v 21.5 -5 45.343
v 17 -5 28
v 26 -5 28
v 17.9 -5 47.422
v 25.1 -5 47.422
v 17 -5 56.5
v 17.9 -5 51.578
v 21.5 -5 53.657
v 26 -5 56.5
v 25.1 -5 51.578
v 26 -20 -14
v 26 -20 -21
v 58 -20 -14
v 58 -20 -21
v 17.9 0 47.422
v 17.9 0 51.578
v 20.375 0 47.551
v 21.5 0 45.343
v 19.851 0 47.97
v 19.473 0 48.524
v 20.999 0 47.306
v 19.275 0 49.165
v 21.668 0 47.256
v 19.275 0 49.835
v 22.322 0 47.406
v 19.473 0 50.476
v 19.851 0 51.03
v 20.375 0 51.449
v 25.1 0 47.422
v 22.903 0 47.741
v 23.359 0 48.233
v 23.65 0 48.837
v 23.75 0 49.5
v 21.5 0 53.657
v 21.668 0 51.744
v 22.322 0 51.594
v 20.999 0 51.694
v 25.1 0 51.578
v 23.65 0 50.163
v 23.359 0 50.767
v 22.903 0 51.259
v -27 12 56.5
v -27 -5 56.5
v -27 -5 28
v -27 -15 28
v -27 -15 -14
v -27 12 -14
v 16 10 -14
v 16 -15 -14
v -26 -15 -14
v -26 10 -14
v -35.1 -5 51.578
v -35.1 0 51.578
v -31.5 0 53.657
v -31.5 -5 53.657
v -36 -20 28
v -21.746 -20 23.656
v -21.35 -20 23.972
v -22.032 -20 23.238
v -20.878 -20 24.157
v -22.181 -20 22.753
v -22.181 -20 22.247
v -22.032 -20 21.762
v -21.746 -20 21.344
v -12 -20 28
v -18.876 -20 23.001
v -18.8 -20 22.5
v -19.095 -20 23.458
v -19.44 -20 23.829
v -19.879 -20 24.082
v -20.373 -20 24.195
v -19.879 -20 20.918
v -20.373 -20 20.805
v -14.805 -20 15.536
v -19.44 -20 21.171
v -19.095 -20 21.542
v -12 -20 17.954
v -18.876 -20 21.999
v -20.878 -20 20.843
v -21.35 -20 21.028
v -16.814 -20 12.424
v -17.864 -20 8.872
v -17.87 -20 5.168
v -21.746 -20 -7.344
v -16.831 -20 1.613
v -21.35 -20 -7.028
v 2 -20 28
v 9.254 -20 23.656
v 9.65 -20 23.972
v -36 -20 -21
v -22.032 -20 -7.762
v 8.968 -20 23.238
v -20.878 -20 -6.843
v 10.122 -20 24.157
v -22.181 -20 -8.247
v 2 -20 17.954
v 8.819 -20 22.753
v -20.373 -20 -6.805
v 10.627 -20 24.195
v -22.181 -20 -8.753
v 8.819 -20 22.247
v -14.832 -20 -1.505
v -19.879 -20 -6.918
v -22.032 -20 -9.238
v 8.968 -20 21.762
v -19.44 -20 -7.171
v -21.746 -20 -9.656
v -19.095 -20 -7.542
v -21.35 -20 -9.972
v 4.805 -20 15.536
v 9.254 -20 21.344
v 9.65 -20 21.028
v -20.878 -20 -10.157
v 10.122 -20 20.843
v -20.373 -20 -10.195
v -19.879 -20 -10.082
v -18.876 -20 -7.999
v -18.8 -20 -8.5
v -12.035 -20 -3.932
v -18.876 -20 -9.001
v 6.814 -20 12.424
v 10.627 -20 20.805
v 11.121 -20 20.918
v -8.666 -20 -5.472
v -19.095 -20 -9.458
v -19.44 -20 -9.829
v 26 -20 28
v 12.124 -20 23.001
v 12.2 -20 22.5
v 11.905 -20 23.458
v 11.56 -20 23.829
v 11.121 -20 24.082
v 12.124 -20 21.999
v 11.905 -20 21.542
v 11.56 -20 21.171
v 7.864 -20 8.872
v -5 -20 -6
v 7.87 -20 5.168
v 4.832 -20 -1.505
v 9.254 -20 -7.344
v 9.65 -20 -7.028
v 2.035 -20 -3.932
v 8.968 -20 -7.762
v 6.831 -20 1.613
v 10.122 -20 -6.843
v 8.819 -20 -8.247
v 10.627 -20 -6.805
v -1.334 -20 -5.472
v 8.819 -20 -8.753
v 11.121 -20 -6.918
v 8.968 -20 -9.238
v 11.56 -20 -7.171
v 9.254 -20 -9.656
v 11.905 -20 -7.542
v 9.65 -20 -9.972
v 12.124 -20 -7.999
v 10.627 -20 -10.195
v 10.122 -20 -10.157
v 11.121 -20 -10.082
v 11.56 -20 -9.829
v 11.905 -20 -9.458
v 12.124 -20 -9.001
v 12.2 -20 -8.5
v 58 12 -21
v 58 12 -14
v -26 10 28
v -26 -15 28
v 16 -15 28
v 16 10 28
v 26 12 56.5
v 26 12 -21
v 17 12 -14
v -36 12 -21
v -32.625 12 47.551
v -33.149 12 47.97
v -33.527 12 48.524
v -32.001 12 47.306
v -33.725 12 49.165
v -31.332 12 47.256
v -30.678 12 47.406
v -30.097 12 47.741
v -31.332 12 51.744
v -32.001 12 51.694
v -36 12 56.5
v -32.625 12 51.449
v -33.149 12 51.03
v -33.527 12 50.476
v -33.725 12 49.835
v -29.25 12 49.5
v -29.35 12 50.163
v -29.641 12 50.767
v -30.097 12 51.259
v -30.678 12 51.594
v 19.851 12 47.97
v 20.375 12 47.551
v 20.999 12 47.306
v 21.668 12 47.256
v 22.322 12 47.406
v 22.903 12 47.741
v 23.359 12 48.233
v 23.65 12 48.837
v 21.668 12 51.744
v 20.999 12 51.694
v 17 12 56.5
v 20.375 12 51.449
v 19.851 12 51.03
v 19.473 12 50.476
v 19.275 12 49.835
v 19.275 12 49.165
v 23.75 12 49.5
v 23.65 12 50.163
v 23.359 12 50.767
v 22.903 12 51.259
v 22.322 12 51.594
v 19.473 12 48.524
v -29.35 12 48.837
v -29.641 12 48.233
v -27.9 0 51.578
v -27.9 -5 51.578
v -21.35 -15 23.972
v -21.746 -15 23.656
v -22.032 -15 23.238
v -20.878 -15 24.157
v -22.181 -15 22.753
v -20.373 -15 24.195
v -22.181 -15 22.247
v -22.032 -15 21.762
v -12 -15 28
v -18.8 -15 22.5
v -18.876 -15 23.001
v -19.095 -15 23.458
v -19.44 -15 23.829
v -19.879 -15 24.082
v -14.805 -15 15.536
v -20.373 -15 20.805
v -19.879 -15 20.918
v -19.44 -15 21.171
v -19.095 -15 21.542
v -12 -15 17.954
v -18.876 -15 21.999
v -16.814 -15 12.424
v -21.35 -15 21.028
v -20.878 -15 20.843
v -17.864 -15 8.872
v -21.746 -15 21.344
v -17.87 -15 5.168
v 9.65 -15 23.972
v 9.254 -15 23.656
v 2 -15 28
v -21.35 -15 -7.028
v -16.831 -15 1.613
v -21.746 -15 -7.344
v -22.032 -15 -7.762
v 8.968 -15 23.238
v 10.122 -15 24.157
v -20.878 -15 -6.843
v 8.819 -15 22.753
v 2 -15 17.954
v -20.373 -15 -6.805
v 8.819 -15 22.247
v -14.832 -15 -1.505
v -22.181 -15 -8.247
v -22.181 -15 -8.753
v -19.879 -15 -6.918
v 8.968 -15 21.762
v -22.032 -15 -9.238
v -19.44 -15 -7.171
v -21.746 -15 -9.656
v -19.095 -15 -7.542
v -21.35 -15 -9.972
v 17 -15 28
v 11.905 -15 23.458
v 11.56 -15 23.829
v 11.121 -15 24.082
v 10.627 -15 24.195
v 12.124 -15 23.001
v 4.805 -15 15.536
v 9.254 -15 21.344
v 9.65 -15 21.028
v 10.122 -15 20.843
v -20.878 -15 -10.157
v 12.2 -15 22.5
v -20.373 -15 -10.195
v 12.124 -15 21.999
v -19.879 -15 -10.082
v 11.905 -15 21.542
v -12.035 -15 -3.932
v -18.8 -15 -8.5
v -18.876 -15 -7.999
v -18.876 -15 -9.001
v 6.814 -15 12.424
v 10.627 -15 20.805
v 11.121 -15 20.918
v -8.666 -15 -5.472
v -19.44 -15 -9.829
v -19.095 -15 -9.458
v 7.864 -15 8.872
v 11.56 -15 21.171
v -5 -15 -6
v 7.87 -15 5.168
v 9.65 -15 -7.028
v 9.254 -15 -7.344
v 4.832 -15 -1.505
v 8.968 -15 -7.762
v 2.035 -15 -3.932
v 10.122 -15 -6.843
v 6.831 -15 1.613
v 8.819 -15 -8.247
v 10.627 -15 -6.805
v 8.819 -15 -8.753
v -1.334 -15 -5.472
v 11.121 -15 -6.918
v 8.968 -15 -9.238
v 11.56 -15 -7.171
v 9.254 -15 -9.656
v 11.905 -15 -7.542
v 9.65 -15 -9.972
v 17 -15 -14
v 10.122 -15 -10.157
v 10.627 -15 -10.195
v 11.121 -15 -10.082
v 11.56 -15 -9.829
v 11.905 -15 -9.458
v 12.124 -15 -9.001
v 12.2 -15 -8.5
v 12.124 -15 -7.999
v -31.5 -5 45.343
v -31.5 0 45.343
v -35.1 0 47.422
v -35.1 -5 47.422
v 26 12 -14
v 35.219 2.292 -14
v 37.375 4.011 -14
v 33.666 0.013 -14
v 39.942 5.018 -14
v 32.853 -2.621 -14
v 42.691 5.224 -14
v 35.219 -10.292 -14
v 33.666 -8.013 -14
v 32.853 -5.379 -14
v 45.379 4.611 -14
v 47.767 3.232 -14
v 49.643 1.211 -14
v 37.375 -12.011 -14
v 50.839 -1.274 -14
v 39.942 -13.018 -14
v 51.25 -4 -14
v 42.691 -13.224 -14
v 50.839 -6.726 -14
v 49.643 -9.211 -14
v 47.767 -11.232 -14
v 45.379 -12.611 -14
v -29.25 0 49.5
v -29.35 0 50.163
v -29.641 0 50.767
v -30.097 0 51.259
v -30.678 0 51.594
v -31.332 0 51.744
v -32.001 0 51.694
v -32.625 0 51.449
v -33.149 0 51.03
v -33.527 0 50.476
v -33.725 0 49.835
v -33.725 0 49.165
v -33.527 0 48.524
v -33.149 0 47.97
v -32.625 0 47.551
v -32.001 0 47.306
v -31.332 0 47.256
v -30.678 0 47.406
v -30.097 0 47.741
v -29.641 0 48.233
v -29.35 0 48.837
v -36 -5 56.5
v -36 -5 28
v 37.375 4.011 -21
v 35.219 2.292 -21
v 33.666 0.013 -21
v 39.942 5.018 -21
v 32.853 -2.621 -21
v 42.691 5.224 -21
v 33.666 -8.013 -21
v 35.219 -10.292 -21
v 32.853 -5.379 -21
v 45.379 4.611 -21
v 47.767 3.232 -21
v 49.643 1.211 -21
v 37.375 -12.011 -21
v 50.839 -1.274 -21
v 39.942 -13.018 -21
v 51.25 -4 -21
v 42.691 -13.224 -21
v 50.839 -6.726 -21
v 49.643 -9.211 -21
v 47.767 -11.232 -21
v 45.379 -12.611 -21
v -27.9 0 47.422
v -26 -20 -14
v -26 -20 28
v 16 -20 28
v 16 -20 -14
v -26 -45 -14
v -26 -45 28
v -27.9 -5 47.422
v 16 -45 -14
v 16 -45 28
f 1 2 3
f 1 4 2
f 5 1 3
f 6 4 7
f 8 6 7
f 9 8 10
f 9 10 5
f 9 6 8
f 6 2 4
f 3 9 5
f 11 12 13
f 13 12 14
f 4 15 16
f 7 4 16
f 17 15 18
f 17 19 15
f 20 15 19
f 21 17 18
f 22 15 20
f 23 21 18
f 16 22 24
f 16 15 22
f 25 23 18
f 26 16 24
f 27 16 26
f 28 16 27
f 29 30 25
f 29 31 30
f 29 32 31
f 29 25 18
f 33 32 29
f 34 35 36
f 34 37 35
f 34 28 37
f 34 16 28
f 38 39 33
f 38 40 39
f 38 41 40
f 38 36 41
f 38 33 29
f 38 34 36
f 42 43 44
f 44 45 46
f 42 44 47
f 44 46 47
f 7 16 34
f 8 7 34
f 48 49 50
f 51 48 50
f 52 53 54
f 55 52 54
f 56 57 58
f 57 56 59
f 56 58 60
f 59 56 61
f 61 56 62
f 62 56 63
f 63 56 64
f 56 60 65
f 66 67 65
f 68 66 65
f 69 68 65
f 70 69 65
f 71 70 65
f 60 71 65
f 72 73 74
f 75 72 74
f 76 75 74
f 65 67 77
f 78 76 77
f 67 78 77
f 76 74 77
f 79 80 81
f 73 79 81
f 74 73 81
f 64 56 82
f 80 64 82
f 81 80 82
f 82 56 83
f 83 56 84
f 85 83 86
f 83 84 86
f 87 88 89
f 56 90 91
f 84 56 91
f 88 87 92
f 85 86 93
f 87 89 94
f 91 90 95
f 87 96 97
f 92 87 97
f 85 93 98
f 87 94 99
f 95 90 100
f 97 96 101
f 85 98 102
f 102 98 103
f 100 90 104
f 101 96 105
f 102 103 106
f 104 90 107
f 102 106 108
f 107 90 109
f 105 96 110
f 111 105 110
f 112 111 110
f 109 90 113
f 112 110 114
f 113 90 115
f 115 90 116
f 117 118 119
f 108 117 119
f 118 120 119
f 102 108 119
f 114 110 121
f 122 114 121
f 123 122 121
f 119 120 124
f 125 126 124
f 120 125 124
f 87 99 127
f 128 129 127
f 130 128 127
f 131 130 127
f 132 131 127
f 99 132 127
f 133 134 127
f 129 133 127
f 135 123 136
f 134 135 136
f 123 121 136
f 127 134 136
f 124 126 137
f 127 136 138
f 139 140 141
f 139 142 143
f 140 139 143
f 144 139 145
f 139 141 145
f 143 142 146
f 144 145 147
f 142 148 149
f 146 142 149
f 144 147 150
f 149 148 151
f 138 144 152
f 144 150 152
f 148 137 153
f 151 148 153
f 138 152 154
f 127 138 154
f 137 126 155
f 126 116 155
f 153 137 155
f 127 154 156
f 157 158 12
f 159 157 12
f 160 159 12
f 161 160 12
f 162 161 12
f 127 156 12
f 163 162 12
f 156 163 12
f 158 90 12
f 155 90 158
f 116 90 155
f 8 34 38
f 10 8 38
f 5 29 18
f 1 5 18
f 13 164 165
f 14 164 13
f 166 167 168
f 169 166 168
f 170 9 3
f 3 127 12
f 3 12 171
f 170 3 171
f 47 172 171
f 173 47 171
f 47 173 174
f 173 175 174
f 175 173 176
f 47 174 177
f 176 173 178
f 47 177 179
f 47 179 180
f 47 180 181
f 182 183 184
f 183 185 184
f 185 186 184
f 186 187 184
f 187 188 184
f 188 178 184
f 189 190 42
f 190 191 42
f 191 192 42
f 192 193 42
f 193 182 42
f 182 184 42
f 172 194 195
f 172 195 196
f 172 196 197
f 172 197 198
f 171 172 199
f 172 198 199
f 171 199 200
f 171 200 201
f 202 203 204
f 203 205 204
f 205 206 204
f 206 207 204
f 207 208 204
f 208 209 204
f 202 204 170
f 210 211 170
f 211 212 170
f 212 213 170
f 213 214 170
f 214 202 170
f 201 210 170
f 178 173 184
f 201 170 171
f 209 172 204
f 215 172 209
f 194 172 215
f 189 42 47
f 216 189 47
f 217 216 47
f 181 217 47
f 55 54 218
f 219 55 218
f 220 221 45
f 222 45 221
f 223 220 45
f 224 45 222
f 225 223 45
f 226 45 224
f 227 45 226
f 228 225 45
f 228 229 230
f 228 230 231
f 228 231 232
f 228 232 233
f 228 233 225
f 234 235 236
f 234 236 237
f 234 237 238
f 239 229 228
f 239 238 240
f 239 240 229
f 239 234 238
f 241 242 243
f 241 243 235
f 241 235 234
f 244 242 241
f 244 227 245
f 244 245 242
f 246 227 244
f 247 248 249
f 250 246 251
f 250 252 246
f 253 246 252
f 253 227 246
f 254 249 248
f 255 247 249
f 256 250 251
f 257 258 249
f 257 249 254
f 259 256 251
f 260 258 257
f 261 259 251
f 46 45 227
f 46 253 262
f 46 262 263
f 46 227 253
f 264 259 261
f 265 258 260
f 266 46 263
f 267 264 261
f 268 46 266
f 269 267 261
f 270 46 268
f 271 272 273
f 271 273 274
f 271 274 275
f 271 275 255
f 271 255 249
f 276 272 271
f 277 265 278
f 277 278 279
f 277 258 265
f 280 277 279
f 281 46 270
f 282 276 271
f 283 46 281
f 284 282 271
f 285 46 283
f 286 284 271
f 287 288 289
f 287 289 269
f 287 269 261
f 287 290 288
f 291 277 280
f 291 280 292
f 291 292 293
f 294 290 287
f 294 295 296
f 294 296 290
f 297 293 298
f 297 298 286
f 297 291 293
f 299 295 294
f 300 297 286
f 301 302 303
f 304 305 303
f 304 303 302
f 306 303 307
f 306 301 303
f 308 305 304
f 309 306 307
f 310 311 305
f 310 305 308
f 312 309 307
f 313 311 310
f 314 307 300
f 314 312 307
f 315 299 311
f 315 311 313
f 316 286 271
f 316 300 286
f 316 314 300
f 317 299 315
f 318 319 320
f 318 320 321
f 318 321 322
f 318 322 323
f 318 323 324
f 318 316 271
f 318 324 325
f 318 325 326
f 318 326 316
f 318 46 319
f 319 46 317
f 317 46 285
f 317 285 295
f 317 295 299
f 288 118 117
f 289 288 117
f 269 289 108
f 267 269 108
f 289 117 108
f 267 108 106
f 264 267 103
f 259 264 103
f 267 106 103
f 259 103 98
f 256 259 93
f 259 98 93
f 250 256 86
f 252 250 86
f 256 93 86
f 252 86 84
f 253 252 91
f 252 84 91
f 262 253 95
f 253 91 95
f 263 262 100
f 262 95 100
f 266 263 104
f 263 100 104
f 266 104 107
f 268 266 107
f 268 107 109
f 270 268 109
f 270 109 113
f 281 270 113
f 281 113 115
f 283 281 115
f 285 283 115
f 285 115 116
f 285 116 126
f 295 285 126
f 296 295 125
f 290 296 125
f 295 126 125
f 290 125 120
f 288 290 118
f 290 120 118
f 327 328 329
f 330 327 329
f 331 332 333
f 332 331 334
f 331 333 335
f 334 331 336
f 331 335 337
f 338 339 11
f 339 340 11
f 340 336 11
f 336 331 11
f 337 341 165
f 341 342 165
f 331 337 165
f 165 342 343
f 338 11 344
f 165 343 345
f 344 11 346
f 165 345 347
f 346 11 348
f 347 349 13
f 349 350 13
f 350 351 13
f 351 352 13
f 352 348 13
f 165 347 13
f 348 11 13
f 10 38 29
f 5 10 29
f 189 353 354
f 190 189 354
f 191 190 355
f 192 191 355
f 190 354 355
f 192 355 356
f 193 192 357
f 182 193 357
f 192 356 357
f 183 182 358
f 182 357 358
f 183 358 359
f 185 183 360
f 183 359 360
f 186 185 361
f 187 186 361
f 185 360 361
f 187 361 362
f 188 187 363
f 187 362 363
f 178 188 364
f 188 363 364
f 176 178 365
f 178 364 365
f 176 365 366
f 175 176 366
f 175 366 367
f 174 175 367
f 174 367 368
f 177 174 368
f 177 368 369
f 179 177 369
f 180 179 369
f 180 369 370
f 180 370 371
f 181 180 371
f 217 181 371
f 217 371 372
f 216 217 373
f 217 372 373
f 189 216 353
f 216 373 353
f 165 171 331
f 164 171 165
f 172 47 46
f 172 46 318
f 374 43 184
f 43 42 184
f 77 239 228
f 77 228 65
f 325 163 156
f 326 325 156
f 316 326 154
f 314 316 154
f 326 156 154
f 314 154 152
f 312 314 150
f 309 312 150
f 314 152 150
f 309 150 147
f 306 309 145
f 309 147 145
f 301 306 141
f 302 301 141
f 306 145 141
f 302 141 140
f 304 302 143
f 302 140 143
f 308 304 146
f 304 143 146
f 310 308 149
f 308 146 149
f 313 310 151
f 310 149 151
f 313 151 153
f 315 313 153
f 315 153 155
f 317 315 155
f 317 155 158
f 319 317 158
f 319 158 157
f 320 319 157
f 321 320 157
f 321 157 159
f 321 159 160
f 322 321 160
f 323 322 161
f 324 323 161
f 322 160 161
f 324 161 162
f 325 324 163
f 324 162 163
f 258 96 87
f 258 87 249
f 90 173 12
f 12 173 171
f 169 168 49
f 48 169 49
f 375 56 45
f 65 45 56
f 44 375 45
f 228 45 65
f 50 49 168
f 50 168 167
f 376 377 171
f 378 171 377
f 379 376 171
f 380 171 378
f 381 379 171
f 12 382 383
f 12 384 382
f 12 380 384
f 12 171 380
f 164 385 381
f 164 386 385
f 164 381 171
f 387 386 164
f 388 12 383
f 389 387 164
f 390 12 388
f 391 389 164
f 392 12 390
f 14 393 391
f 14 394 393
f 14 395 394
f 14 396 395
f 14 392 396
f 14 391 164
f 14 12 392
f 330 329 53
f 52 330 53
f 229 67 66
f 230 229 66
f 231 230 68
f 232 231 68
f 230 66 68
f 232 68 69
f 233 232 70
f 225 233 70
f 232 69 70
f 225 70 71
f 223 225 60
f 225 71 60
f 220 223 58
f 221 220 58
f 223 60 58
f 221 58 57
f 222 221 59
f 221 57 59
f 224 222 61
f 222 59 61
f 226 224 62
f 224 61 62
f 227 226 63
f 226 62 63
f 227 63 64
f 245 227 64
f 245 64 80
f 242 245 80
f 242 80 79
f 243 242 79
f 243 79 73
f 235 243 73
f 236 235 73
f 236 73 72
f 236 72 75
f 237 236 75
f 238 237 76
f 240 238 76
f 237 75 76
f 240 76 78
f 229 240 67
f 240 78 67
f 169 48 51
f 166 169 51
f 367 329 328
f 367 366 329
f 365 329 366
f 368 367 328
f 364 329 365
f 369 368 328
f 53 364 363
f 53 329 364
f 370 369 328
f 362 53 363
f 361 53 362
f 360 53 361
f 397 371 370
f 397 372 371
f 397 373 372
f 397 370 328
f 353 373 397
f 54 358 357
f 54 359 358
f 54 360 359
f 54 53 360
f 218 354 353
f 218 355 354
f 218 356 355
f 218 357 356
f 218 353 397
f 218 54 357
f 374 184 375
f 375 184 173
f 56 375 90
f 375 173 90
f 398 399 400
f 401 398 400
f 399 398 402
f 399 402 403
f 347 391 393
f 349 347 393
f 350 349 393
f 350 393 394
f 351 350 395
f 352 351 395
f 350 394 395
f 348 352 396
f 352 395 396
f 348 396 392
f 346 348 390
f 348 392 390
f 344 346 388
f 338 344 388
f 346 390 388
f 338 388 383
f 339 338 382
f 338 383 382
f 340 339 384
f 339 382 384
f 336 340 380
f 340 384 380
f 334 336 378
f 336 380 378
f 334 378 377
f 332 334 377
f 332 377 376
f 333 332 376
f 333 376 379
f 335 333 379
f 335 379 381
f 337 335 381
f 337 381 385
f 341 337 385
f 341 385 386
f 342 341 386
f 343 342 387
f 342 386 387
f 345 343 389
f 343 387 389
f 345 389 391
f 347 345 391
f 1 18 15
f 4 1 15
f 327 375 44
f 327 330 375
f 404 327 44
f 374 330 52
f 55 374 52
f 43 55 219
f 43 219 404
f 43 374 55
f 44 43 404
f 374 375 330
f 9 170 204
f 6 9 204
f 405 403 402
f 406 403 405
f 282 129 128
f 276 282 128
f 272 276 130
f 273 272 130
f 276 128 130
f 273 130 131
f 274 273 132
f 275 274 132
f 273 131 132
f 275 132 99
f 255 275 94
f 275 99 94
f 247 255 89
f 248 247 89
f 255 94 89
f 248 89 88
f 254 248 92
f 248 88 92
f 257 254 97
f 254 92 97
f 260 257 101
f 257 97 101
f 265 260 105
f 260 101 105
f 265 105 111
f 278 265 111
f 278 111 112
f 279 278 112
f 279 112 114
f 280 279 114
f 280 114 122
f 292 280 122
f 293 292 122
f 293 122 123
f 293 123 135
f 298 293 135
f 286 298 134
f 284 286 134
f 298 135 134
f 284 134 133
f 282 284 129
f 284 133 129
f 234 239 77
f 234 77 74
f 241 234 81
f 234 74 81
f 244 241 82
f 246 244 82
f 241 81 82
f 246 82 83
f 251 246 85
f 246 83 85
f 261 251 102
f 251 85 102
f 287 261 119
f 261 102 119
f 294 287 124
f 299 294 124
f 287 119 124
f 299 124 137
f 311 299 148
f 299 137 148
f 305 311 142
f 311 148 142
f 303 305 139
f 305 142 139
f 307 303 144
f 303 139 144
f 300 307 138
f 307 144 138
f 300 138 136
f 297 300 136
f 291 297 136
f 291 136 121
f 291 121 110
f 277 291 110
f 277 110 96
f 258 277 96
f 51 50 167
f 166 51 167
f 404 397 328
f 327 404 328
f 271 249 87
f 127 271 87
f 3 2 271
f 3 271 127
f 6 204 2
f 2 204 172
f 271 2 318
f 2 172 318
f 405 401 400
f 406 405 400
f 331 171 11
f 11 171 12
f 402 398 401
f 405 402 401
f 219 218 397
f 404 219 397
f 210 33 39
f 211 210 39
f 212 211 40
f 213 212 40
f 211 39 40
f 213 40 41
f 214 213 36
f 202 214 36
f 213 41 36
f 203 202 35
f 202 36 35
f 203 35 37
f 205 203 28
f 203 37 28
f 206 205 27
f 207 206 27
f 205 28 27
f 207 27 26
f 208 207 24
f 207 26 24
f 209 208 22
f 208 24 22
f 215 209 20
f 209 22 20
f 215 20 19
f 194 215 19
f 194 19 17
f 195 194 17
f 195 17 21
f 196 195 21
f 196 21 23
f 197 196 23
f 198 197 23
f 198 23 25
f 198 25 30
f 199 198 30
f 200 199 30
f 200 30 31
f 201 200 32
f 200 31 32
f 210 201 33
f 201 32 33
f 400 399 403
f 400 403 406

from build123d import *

# Parameters (mm, degrees)
F1_R      = 2.25
F2_DEPTH  = 12
F4_DEPTH  = 5
F5_W      = 44
F5_H      = 10
F5_H_2    = 5
F6_DEPTH  = 7
F7_DEPTH  = 42
F8_R      = 1.7
F8_R_2    = 13
F9_DEPTH  = 5
F11_REACH = 63.8670687473
F12_R     = 1.7
F13_DEPTH = 25
F14_W     = 42
F14_H     = 42
F14_R     = 1.7
F14_R_2   = 13
F15_DEPTH = 25
F16_W     = 32
F16_H     = 32
F16_R     = 9.25
F17_DEPTH = 7


with BuildPart() as f2:
    # F1 (on Front) → F2 (new body)
    with BuildSketch(Plane.XZ):
        Polygon((-27, 56.5), (-36, 56.5), (-36, -21), (26, -21), (26, 56.5), (17, 56.5), (17, -14), (-27, -14), align=None)
        with Locations((-31.5, 49.5)):
            Circle(F1_R, mode=Mode.SUBTRACT)
        with Locations((21.5, 49.5)):
            Circle(F1_R, mode=Mode.SUBTRACT)
    extrude(amount=-F2_DEPTH)

    # F3 (on face) → F4 (join)
    with BuildSketch(Plane.XZ):
        Polygon((-27, -14), (-27, 56.5), (-36, 56.5), (-36, -21), (26, -21), (26, 56.5), (17, 56.5), (17, -14), align=None)
        Polygon((-31.5, 53.6569219382), (-27.9, 51.5784609691), (-27.9, 47.4215390309), (-31.5, 45.3430780618), (-35.1, 47.4215390309), (-35.1, 51.5784609691), align=None, mode=Mode.SUBTRACT)
        Polygon((21.5, 53.6569219382), (25.1, 51.5784609691), (25.1, 47.4215390309), (21.5, 45.3430780618), (17.9, 47.4215390309), (17.9, 51.5784609691), align=None, mode=Mode.SUBTRACT)
    extrude(amount=F4_DEPTH)

    # F5 (on face) → F6 (join, through all)
    with BuildSketch(Plane.XY.offset(-14)):
        with Locations((-5, -10)):
            Rectangle(F5_W, F5_H)
        with Locations((-5, -17.5)):
            Rectangle(F5_W, F5_H_2)
        Polygon((-27, -15), (-27, -5), (-36, -5), (-36, -20), (-27, -20), align=None)
        Polygon((26, -5), (17, -5), (17, -15), (17, -20), (26, -20), align=None)
    extrude(amount=-F6_DEPTH)

    # F5 (on face) → F7 (join)
    with BuildSketch(Plane.XY.offset(-14)):
        with Locations((-5, -17.5)):
            Rectangle(F5_W, F5_H_2)
        Polygon((-27, -15), (-27, -5), (-36, -5), (-36, -20), (-27, -20), align=None)
        Polygon((26, -5), (17, -5), (17, -15), (17, -20), (26, -20), align=None)
    extrude(amount=F7_DEPTH)

    # F8 (on face) → F9 (cut, through all)
    with BuildSketch(Plane.XZ.offset(20)):
        with Locations((-20.5, 22.5)):
            Circle(F8_R)
        with Locations((-5, 7)):
            Circle(F8_R_2)
        with Locations((-20.5, -8.5)):
            Circle(F8_R)
        with Locations((10.5, -8.5)):
            Circle(F8_R)
        with Locations((10.5, 22.5)):
            Circle(F8_R)
    extrude(amount=-F9_DEPTH, mode=Mode.SUBTRACT)

    f11_end = f2.faces().sort_by_distance((-18, -17.5, 7))[0]
    # F10 (on face) → F11 (cut, up to a face of the model that its end follows)
    with BuildSketch(Plane.XY.offset(28)):
        Polygon((2, -15), (-5, -15), (-12, -15), (-12, -20), (2, -20), align=None)
    f11_long = extrude(amount=-F11_REACH, mode=Mode.PRIVATE)
    add(split(f11_long, bisect_by=f11_end, keep=Keep.ALL, mode=Mode.PRIVATE).solids().sort_by_distance((-5, -17.5, 28))[0], mode=Mode.SUBTRACT)


with BuildPart() as f13:
    # F12 (on face) → F13 (new body)
    with BuildSketch(Plane(origin=(0, -15, 0), x_dir=(-1, 0, 0), z_dir=(0, 1, 0))):
        with BuildLine():
            Line((-16, -14), (26, -14))
            Line((26, -14), (26, 28))
            Line((26, 28), (12, 28))
            Line((12, 28), (12, 17.9544511501))
            ThreePointArc((12, 17.9544511501), (5, -6), (-2, 17.9544511501))
            Line((-2, 17.9544511501), (-2, 28))
            Line((-2, 28), (-16, 28))
            Line((-16, 28), (-16, -14))
        make_face()
        with Locations((-10.5, -8.5)):
            Circle(F12_R, mode=Mode.SUBTRACT)
        with Locations((20.5, -8.5)):
            Circle(F12_R, mode=Mode.SUBTRACT)
        with Locations((-10.5, 22.5)):
            Circle(F12_R, mode=Mode.SUBTRACT)
        with Locations((20.5, 22.5)):
            Circle(F12_R, mode=Mode.SUBTRACT)
        with BuildLine():
            Line((12, 17.9544511501), (12, 28))
            Line((12, 28), (-2, 28))
            Line((-2, 28), (-2, 17.9544511501))
            ThreePointArc((-2, 17.9544511501), (5, -6), (12, 17.9544511501))
        make_face()
        with Locations((-10.5, 22.5)):
            Circle(F12_R)
        with Locations((20.5, 22.5)):
            Circle(F12_R)
        with Locations((-10.5, -8.5)):
            Circle(F12_R)
        with Locations((20.5, -8.5)):
            Circle(F12_R)
    extrude(amount=F13_DEPTH)


with BuildPart() as f15:
    # F14 (on face) → F15 (new body)
    with BuildSketch(Plane.XZ.offset(20)):
        with Locations((-5, 7)):
            Rectangle(F14_W, F14_H)
        with Locations((-20.5, -8.5)):
            Circle(F14_R, mode=Mode.SUBTRACT)
        with Locations((10.5, -8.5)):
            Circle(F14_R, mode=Mode.SUBTRACT)
        with Locations((-20.5, 22.5)):
            Circle(F14_R, mode=Mode.SUBTRACT)
        with Locations((-5, 7)):
            Circle(F14_R_2, mode=Mode.SUBTRACT)
        with Locations((10.5, 22.5)):
            Circle(F14_R, mode=Mode.SUBTRACT)
    extrude(amount=F15_DEPTH)

    # F8 (on face) → F15, piece 2 (join)
    with BuildSketch(Plane.XZ.offset(20)):
        with Locations((-20.5, 22.5)):
            Circle(F8_R)
    extrude(amount=F15_DEPTH)

    # F8 (on face) → F15, piece 3 (join)
    with BuildSketch(Plane.XZ.offset(20)):
        with Locations((-5, 7)):
            Circle(F8_R_2)
    extrude(amount=F15_DEPTH)

    # F8 (on face) → F15, piece 4 (join)
    with BuildSketch(Plane.XZ.offset(20)):
        with Locations((-20.5, -8.5)):
            Circle(F8_R)
    extrude(amount=F15_DEPTH)

    # F8 (on face) → F15, piece 5 (join)
    with BuildSketch(Plane.XZ.offset(20)):
        with Locations((10.5, 22.5)):
            Circle(F8_R)
    extrude(amount=F15_DEPTH)

    # F8 (on face) → F15, piece 6 (join)
    with BuildSketch(Plane.XZ.offset(20)):
        with Locations((10.5, -8.5)):
            Circle(F8_R)
    extrude(amount=F15_DEPTH)


with BuildPart() as f17:
    # F16 (on face) → F17 (new body, through all)
    with BuildSketch(Plane(origin=(0, 0, -21), x_dir=(1, 0, 0), z_dir=(0, 0, -1))):
        with Locations((42, 4)):
            Rectangle(F16_W, F16_H)
        with Locations((42, 4)):
            Circle(F16_R, mode=Mode.SUBTRACT)
    extrude(amount=-F17_DEPTH)


solid = Compound([f2.part, f13.part, f15.part, f17.part])
